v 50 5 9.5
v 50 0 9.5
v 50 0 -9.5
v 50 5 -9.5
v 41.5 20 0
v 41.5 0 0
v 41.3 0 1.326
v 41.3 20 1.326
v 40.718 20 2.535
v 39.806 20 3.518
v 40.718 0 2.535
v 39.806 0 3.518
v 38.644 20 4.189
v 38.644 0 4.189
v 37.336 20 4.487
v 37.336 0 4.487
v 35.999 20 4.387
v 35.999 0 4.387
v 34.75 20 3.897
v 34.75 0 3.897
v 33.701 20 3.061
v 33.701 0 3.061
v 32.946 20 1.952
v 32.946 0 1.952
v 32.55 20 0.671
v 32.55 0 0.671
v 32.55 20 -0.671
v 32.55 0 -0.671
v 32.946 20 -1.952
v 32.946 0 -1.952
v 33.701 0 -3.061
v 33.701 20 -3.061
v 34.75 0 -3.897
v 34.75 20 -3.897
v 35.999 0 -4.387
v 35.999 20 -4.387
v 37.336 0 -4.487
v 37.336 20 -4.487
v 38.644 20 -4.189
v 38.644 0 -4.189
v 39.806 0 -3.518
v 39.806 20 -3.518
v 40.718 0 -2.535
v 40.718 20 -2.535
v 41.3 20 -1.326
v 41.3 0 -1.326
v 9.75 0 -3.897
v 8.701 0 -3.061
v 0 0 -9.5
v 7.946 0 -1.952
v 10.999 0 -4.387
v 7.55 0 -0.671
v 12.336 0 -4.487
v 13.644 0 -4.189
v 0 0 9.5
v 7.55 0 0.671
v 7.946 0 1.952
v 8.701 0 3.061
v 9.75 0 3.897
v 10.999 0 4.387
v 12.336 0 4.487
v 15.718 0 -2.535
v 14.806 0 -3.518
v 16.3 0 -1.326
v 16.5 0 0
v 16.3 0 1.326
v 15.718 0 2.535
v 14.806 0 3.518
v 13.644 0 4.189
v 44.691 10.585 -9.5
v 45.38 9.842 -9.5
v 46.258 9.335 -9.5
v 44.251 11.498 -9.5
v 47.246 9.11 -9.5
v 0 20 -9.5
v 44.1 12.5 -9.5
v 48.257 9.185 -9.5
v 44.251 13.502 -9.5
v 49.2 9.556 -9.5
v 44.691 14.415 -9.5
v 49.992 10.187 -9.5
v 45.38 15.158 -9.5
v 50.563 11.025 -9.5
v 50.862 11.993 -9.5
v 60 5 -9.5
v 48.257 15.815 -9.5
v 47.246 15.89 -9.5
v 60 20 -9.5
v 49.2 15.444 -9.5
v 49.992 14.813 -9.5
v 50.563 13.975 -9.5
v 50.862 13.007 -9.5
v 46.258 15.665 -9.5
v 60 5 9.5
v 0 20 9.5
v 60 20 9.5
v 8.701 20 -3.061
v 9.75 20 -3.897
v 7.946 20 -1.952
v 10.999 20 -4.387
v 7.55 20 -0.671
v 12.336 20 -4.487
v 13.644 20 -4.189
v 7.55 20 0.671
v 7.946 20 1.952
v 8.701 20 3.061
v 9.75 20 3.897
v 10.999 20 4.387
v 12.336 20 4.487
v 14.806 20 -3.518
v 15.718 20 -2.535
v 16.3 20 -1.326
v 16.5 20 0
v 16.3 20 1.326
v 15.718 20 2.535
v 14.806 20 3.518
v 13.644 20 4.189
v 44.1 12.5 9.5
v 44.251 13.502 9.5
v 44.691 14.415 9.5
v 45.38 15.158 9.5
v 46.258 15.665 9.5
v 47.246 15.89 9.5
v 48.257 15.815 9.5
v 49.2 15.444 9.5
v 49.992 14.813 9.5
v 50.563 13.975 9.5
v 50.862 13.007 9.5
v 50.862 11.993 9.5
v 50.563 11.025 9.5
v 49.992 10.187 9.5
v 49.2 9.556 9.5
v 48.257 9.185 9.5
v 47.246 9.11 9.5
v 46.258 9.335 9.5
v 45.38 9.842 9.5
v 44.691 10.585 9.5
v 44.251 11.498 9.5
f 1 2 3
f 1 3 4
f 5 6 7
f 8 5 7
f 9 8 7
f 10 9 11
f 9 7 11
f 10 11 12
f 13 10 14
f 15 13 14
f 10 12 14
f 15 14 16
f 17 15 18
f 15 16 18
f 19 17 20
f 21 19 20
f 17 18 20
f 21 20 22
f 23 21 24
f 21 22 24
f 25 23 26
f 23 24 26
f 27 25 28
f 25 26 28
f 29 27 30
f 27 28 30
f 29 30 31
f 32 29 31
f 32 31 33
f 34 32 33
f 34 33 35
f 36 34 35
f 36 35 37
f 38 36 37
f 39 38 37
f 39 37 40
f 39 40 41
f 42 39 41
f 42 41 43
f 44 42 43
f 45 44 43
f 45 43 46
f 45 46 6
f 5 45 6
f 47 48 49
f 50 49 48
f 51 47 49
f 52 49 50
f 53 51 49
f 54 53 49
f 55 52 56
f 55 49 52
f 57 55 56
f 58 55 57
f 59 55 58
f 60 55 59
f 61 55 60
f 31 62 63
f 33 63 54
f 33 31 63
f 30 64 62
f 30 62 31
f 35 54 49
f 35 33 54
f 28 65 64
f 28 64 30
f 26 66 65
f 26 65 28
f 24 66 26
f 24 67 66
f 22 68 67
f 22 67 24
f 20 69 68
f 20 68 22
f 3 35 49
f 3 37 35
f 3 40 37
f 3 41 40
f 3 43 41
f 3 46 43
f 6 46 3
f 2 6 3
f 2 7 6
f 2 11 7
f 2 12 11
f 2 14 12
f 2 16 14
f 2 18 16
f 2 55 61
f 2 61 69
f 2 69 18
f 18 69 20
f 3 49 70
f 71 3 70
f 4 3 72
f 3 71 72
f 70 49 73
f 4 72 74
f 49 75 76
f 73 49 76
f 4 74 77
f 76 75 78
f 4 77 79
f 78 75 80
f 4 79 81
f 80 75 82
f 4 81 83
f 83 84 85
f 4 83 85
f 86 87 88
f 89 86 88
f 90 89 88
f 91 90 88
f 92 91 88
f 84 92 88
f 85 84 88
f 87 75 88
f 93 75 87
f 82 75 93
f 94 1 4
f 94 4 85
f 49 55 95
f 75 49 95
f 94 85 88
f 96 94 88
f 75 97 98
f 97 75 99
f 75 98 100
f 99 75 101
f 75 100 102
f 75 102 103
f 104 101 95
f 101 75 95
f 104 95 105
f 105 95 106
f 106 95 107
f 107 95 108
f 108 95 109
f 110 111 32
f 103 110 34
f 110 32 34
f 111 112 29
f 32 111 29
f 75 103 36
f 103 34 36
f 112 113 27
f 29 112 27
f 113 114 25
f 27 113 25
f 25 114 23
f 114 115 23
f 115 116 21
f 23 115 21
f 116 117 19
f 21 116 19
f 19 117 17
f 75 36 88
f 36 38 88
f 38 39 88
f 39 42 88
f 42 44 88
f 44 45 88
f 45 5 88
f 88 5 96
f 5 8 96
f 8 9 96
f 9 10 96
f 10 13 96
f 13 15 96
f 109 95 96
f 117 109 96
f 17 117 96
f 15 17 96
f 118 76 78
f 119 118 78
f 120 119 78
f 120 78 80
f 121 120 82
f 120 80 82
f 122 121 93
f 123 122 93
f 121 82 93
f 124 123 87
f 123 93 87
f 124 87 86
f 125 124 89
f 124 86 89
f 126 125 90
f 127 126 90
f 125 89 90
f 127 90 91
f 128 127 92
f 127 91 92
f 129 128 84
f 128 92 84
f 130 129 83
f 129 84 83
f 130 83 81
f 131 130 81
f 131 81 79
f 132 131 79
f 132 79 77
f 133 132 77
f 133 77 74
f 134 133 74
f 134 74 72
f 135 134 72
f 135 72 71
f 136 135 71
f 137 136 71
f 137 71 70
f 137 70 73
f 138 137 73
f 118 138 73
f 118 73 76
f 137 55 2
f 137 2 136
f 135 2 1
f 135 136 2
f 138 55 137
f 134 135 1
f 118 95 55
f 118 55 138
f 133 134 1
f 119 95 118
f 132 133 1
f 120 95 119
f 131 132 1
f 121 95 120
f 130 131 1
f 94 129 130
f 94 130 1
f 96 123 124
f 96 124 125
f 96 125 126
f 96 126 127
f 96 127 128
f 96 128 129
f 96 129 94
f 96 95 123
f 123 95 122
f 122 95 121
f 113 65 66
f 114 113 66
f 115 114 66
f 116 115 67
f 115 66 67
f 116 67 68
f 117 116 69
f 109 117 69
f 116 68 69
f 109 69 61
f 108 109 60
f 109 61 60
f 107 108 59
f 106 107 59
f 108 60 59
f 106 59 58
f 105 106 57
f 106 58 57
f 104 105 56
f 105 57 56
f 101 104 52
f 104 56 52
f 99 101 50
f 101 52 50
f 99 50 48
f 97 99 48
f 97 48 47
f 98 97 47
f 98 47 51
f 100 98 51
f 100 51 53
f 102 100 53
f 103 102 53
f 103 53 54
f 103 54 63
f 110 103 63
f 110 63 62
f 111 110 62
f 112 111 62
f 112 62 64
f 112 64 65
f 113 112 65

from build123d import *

# Parameters (mm, degrees)
SKETCH1_W                = 60
SKETCH1_H                = 20
BOSS_EXTRUDE1_DEPTH      = 9.5
SKETCH2_W                = 10
SKETCH2_H                = 5
CUT_EXTRUDE1_DEPTH       = 20
F_9_0_9_DIAMETER_HOLE1_D = 9
M8X1_25_TAPPED_HOLE1_D   = 6.8


with BuildPart() as part:
    # Sketch1 → Boss-Extrude1 (new body, symmetric)
    with BuildSketch(Plane.XY):
        with Locations((30, 10)):
            Rectangle(SKETCH1_W, SKETCH1_H)
    extrude(amount=BOSS_EXTRUDE1_DEPTH, both=True)

    # Sketch2 → Cut-Extrude1 (cut, through all)
    with BuildSketch(Plane.XY.offset(9.5)):
        with Locations((55, 2.5)):
            Rectangle(SKETCH2_W, SKETCH2_H)
    extrude(amount=-CUT_EXTRUDE1_DEPTH, mode=Mode.SUBTRACT)

    # Ø9.0 (9) Diameter Hole1 (through all)
    with Locations(Plane(origin=(0, 20, 0), x_dir=(-1, 0, 0), z_dir=(0, 1, 0))):
        with Locations((-12, 0), (-37, 0)):
            Hole(F_9_0_9_DIAMETER_HOLE1_D / 2)

    # M8x1.25 Tapped Hole1 (through all)
    with Locations(Plane.XY.offset(9.5)):
        with Locations((47.5, 12.5)):
            Hole(M8X1_25_TAPPED_HOLE1_D / 2)


solid = part.part
